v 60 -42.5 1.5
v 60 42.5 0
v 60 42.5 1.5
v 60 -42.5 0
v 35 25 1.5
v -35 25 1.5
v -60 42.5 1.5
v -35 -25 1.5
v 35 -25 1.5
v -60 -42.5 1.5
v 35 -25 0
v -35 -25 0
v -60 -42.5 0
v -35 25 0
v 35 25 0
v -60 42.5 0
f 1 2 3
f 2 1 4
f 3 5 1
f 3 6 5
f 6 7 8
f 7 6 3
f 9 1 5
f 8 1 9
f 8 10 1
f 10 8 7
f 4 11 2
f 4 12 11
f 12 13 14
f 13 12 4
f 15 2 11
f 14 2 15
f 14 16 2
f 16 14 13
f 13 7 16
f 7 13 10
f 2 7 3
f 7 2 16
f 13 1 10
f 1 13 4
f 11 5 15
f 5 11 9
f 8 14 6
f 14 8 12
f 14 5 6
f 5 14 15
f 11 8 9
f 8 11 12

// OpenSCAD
thickness = 1.5;
POST_WIDTH_X = 42.5;
POST_OFFSET_Y = 24.5;

difference()
{
	translate([0,0, thickness/2]) cube([120,85,thickness],center=true);
	translate([0,0, thickness/2]) cube([70,50,thickness],center=true);
}
